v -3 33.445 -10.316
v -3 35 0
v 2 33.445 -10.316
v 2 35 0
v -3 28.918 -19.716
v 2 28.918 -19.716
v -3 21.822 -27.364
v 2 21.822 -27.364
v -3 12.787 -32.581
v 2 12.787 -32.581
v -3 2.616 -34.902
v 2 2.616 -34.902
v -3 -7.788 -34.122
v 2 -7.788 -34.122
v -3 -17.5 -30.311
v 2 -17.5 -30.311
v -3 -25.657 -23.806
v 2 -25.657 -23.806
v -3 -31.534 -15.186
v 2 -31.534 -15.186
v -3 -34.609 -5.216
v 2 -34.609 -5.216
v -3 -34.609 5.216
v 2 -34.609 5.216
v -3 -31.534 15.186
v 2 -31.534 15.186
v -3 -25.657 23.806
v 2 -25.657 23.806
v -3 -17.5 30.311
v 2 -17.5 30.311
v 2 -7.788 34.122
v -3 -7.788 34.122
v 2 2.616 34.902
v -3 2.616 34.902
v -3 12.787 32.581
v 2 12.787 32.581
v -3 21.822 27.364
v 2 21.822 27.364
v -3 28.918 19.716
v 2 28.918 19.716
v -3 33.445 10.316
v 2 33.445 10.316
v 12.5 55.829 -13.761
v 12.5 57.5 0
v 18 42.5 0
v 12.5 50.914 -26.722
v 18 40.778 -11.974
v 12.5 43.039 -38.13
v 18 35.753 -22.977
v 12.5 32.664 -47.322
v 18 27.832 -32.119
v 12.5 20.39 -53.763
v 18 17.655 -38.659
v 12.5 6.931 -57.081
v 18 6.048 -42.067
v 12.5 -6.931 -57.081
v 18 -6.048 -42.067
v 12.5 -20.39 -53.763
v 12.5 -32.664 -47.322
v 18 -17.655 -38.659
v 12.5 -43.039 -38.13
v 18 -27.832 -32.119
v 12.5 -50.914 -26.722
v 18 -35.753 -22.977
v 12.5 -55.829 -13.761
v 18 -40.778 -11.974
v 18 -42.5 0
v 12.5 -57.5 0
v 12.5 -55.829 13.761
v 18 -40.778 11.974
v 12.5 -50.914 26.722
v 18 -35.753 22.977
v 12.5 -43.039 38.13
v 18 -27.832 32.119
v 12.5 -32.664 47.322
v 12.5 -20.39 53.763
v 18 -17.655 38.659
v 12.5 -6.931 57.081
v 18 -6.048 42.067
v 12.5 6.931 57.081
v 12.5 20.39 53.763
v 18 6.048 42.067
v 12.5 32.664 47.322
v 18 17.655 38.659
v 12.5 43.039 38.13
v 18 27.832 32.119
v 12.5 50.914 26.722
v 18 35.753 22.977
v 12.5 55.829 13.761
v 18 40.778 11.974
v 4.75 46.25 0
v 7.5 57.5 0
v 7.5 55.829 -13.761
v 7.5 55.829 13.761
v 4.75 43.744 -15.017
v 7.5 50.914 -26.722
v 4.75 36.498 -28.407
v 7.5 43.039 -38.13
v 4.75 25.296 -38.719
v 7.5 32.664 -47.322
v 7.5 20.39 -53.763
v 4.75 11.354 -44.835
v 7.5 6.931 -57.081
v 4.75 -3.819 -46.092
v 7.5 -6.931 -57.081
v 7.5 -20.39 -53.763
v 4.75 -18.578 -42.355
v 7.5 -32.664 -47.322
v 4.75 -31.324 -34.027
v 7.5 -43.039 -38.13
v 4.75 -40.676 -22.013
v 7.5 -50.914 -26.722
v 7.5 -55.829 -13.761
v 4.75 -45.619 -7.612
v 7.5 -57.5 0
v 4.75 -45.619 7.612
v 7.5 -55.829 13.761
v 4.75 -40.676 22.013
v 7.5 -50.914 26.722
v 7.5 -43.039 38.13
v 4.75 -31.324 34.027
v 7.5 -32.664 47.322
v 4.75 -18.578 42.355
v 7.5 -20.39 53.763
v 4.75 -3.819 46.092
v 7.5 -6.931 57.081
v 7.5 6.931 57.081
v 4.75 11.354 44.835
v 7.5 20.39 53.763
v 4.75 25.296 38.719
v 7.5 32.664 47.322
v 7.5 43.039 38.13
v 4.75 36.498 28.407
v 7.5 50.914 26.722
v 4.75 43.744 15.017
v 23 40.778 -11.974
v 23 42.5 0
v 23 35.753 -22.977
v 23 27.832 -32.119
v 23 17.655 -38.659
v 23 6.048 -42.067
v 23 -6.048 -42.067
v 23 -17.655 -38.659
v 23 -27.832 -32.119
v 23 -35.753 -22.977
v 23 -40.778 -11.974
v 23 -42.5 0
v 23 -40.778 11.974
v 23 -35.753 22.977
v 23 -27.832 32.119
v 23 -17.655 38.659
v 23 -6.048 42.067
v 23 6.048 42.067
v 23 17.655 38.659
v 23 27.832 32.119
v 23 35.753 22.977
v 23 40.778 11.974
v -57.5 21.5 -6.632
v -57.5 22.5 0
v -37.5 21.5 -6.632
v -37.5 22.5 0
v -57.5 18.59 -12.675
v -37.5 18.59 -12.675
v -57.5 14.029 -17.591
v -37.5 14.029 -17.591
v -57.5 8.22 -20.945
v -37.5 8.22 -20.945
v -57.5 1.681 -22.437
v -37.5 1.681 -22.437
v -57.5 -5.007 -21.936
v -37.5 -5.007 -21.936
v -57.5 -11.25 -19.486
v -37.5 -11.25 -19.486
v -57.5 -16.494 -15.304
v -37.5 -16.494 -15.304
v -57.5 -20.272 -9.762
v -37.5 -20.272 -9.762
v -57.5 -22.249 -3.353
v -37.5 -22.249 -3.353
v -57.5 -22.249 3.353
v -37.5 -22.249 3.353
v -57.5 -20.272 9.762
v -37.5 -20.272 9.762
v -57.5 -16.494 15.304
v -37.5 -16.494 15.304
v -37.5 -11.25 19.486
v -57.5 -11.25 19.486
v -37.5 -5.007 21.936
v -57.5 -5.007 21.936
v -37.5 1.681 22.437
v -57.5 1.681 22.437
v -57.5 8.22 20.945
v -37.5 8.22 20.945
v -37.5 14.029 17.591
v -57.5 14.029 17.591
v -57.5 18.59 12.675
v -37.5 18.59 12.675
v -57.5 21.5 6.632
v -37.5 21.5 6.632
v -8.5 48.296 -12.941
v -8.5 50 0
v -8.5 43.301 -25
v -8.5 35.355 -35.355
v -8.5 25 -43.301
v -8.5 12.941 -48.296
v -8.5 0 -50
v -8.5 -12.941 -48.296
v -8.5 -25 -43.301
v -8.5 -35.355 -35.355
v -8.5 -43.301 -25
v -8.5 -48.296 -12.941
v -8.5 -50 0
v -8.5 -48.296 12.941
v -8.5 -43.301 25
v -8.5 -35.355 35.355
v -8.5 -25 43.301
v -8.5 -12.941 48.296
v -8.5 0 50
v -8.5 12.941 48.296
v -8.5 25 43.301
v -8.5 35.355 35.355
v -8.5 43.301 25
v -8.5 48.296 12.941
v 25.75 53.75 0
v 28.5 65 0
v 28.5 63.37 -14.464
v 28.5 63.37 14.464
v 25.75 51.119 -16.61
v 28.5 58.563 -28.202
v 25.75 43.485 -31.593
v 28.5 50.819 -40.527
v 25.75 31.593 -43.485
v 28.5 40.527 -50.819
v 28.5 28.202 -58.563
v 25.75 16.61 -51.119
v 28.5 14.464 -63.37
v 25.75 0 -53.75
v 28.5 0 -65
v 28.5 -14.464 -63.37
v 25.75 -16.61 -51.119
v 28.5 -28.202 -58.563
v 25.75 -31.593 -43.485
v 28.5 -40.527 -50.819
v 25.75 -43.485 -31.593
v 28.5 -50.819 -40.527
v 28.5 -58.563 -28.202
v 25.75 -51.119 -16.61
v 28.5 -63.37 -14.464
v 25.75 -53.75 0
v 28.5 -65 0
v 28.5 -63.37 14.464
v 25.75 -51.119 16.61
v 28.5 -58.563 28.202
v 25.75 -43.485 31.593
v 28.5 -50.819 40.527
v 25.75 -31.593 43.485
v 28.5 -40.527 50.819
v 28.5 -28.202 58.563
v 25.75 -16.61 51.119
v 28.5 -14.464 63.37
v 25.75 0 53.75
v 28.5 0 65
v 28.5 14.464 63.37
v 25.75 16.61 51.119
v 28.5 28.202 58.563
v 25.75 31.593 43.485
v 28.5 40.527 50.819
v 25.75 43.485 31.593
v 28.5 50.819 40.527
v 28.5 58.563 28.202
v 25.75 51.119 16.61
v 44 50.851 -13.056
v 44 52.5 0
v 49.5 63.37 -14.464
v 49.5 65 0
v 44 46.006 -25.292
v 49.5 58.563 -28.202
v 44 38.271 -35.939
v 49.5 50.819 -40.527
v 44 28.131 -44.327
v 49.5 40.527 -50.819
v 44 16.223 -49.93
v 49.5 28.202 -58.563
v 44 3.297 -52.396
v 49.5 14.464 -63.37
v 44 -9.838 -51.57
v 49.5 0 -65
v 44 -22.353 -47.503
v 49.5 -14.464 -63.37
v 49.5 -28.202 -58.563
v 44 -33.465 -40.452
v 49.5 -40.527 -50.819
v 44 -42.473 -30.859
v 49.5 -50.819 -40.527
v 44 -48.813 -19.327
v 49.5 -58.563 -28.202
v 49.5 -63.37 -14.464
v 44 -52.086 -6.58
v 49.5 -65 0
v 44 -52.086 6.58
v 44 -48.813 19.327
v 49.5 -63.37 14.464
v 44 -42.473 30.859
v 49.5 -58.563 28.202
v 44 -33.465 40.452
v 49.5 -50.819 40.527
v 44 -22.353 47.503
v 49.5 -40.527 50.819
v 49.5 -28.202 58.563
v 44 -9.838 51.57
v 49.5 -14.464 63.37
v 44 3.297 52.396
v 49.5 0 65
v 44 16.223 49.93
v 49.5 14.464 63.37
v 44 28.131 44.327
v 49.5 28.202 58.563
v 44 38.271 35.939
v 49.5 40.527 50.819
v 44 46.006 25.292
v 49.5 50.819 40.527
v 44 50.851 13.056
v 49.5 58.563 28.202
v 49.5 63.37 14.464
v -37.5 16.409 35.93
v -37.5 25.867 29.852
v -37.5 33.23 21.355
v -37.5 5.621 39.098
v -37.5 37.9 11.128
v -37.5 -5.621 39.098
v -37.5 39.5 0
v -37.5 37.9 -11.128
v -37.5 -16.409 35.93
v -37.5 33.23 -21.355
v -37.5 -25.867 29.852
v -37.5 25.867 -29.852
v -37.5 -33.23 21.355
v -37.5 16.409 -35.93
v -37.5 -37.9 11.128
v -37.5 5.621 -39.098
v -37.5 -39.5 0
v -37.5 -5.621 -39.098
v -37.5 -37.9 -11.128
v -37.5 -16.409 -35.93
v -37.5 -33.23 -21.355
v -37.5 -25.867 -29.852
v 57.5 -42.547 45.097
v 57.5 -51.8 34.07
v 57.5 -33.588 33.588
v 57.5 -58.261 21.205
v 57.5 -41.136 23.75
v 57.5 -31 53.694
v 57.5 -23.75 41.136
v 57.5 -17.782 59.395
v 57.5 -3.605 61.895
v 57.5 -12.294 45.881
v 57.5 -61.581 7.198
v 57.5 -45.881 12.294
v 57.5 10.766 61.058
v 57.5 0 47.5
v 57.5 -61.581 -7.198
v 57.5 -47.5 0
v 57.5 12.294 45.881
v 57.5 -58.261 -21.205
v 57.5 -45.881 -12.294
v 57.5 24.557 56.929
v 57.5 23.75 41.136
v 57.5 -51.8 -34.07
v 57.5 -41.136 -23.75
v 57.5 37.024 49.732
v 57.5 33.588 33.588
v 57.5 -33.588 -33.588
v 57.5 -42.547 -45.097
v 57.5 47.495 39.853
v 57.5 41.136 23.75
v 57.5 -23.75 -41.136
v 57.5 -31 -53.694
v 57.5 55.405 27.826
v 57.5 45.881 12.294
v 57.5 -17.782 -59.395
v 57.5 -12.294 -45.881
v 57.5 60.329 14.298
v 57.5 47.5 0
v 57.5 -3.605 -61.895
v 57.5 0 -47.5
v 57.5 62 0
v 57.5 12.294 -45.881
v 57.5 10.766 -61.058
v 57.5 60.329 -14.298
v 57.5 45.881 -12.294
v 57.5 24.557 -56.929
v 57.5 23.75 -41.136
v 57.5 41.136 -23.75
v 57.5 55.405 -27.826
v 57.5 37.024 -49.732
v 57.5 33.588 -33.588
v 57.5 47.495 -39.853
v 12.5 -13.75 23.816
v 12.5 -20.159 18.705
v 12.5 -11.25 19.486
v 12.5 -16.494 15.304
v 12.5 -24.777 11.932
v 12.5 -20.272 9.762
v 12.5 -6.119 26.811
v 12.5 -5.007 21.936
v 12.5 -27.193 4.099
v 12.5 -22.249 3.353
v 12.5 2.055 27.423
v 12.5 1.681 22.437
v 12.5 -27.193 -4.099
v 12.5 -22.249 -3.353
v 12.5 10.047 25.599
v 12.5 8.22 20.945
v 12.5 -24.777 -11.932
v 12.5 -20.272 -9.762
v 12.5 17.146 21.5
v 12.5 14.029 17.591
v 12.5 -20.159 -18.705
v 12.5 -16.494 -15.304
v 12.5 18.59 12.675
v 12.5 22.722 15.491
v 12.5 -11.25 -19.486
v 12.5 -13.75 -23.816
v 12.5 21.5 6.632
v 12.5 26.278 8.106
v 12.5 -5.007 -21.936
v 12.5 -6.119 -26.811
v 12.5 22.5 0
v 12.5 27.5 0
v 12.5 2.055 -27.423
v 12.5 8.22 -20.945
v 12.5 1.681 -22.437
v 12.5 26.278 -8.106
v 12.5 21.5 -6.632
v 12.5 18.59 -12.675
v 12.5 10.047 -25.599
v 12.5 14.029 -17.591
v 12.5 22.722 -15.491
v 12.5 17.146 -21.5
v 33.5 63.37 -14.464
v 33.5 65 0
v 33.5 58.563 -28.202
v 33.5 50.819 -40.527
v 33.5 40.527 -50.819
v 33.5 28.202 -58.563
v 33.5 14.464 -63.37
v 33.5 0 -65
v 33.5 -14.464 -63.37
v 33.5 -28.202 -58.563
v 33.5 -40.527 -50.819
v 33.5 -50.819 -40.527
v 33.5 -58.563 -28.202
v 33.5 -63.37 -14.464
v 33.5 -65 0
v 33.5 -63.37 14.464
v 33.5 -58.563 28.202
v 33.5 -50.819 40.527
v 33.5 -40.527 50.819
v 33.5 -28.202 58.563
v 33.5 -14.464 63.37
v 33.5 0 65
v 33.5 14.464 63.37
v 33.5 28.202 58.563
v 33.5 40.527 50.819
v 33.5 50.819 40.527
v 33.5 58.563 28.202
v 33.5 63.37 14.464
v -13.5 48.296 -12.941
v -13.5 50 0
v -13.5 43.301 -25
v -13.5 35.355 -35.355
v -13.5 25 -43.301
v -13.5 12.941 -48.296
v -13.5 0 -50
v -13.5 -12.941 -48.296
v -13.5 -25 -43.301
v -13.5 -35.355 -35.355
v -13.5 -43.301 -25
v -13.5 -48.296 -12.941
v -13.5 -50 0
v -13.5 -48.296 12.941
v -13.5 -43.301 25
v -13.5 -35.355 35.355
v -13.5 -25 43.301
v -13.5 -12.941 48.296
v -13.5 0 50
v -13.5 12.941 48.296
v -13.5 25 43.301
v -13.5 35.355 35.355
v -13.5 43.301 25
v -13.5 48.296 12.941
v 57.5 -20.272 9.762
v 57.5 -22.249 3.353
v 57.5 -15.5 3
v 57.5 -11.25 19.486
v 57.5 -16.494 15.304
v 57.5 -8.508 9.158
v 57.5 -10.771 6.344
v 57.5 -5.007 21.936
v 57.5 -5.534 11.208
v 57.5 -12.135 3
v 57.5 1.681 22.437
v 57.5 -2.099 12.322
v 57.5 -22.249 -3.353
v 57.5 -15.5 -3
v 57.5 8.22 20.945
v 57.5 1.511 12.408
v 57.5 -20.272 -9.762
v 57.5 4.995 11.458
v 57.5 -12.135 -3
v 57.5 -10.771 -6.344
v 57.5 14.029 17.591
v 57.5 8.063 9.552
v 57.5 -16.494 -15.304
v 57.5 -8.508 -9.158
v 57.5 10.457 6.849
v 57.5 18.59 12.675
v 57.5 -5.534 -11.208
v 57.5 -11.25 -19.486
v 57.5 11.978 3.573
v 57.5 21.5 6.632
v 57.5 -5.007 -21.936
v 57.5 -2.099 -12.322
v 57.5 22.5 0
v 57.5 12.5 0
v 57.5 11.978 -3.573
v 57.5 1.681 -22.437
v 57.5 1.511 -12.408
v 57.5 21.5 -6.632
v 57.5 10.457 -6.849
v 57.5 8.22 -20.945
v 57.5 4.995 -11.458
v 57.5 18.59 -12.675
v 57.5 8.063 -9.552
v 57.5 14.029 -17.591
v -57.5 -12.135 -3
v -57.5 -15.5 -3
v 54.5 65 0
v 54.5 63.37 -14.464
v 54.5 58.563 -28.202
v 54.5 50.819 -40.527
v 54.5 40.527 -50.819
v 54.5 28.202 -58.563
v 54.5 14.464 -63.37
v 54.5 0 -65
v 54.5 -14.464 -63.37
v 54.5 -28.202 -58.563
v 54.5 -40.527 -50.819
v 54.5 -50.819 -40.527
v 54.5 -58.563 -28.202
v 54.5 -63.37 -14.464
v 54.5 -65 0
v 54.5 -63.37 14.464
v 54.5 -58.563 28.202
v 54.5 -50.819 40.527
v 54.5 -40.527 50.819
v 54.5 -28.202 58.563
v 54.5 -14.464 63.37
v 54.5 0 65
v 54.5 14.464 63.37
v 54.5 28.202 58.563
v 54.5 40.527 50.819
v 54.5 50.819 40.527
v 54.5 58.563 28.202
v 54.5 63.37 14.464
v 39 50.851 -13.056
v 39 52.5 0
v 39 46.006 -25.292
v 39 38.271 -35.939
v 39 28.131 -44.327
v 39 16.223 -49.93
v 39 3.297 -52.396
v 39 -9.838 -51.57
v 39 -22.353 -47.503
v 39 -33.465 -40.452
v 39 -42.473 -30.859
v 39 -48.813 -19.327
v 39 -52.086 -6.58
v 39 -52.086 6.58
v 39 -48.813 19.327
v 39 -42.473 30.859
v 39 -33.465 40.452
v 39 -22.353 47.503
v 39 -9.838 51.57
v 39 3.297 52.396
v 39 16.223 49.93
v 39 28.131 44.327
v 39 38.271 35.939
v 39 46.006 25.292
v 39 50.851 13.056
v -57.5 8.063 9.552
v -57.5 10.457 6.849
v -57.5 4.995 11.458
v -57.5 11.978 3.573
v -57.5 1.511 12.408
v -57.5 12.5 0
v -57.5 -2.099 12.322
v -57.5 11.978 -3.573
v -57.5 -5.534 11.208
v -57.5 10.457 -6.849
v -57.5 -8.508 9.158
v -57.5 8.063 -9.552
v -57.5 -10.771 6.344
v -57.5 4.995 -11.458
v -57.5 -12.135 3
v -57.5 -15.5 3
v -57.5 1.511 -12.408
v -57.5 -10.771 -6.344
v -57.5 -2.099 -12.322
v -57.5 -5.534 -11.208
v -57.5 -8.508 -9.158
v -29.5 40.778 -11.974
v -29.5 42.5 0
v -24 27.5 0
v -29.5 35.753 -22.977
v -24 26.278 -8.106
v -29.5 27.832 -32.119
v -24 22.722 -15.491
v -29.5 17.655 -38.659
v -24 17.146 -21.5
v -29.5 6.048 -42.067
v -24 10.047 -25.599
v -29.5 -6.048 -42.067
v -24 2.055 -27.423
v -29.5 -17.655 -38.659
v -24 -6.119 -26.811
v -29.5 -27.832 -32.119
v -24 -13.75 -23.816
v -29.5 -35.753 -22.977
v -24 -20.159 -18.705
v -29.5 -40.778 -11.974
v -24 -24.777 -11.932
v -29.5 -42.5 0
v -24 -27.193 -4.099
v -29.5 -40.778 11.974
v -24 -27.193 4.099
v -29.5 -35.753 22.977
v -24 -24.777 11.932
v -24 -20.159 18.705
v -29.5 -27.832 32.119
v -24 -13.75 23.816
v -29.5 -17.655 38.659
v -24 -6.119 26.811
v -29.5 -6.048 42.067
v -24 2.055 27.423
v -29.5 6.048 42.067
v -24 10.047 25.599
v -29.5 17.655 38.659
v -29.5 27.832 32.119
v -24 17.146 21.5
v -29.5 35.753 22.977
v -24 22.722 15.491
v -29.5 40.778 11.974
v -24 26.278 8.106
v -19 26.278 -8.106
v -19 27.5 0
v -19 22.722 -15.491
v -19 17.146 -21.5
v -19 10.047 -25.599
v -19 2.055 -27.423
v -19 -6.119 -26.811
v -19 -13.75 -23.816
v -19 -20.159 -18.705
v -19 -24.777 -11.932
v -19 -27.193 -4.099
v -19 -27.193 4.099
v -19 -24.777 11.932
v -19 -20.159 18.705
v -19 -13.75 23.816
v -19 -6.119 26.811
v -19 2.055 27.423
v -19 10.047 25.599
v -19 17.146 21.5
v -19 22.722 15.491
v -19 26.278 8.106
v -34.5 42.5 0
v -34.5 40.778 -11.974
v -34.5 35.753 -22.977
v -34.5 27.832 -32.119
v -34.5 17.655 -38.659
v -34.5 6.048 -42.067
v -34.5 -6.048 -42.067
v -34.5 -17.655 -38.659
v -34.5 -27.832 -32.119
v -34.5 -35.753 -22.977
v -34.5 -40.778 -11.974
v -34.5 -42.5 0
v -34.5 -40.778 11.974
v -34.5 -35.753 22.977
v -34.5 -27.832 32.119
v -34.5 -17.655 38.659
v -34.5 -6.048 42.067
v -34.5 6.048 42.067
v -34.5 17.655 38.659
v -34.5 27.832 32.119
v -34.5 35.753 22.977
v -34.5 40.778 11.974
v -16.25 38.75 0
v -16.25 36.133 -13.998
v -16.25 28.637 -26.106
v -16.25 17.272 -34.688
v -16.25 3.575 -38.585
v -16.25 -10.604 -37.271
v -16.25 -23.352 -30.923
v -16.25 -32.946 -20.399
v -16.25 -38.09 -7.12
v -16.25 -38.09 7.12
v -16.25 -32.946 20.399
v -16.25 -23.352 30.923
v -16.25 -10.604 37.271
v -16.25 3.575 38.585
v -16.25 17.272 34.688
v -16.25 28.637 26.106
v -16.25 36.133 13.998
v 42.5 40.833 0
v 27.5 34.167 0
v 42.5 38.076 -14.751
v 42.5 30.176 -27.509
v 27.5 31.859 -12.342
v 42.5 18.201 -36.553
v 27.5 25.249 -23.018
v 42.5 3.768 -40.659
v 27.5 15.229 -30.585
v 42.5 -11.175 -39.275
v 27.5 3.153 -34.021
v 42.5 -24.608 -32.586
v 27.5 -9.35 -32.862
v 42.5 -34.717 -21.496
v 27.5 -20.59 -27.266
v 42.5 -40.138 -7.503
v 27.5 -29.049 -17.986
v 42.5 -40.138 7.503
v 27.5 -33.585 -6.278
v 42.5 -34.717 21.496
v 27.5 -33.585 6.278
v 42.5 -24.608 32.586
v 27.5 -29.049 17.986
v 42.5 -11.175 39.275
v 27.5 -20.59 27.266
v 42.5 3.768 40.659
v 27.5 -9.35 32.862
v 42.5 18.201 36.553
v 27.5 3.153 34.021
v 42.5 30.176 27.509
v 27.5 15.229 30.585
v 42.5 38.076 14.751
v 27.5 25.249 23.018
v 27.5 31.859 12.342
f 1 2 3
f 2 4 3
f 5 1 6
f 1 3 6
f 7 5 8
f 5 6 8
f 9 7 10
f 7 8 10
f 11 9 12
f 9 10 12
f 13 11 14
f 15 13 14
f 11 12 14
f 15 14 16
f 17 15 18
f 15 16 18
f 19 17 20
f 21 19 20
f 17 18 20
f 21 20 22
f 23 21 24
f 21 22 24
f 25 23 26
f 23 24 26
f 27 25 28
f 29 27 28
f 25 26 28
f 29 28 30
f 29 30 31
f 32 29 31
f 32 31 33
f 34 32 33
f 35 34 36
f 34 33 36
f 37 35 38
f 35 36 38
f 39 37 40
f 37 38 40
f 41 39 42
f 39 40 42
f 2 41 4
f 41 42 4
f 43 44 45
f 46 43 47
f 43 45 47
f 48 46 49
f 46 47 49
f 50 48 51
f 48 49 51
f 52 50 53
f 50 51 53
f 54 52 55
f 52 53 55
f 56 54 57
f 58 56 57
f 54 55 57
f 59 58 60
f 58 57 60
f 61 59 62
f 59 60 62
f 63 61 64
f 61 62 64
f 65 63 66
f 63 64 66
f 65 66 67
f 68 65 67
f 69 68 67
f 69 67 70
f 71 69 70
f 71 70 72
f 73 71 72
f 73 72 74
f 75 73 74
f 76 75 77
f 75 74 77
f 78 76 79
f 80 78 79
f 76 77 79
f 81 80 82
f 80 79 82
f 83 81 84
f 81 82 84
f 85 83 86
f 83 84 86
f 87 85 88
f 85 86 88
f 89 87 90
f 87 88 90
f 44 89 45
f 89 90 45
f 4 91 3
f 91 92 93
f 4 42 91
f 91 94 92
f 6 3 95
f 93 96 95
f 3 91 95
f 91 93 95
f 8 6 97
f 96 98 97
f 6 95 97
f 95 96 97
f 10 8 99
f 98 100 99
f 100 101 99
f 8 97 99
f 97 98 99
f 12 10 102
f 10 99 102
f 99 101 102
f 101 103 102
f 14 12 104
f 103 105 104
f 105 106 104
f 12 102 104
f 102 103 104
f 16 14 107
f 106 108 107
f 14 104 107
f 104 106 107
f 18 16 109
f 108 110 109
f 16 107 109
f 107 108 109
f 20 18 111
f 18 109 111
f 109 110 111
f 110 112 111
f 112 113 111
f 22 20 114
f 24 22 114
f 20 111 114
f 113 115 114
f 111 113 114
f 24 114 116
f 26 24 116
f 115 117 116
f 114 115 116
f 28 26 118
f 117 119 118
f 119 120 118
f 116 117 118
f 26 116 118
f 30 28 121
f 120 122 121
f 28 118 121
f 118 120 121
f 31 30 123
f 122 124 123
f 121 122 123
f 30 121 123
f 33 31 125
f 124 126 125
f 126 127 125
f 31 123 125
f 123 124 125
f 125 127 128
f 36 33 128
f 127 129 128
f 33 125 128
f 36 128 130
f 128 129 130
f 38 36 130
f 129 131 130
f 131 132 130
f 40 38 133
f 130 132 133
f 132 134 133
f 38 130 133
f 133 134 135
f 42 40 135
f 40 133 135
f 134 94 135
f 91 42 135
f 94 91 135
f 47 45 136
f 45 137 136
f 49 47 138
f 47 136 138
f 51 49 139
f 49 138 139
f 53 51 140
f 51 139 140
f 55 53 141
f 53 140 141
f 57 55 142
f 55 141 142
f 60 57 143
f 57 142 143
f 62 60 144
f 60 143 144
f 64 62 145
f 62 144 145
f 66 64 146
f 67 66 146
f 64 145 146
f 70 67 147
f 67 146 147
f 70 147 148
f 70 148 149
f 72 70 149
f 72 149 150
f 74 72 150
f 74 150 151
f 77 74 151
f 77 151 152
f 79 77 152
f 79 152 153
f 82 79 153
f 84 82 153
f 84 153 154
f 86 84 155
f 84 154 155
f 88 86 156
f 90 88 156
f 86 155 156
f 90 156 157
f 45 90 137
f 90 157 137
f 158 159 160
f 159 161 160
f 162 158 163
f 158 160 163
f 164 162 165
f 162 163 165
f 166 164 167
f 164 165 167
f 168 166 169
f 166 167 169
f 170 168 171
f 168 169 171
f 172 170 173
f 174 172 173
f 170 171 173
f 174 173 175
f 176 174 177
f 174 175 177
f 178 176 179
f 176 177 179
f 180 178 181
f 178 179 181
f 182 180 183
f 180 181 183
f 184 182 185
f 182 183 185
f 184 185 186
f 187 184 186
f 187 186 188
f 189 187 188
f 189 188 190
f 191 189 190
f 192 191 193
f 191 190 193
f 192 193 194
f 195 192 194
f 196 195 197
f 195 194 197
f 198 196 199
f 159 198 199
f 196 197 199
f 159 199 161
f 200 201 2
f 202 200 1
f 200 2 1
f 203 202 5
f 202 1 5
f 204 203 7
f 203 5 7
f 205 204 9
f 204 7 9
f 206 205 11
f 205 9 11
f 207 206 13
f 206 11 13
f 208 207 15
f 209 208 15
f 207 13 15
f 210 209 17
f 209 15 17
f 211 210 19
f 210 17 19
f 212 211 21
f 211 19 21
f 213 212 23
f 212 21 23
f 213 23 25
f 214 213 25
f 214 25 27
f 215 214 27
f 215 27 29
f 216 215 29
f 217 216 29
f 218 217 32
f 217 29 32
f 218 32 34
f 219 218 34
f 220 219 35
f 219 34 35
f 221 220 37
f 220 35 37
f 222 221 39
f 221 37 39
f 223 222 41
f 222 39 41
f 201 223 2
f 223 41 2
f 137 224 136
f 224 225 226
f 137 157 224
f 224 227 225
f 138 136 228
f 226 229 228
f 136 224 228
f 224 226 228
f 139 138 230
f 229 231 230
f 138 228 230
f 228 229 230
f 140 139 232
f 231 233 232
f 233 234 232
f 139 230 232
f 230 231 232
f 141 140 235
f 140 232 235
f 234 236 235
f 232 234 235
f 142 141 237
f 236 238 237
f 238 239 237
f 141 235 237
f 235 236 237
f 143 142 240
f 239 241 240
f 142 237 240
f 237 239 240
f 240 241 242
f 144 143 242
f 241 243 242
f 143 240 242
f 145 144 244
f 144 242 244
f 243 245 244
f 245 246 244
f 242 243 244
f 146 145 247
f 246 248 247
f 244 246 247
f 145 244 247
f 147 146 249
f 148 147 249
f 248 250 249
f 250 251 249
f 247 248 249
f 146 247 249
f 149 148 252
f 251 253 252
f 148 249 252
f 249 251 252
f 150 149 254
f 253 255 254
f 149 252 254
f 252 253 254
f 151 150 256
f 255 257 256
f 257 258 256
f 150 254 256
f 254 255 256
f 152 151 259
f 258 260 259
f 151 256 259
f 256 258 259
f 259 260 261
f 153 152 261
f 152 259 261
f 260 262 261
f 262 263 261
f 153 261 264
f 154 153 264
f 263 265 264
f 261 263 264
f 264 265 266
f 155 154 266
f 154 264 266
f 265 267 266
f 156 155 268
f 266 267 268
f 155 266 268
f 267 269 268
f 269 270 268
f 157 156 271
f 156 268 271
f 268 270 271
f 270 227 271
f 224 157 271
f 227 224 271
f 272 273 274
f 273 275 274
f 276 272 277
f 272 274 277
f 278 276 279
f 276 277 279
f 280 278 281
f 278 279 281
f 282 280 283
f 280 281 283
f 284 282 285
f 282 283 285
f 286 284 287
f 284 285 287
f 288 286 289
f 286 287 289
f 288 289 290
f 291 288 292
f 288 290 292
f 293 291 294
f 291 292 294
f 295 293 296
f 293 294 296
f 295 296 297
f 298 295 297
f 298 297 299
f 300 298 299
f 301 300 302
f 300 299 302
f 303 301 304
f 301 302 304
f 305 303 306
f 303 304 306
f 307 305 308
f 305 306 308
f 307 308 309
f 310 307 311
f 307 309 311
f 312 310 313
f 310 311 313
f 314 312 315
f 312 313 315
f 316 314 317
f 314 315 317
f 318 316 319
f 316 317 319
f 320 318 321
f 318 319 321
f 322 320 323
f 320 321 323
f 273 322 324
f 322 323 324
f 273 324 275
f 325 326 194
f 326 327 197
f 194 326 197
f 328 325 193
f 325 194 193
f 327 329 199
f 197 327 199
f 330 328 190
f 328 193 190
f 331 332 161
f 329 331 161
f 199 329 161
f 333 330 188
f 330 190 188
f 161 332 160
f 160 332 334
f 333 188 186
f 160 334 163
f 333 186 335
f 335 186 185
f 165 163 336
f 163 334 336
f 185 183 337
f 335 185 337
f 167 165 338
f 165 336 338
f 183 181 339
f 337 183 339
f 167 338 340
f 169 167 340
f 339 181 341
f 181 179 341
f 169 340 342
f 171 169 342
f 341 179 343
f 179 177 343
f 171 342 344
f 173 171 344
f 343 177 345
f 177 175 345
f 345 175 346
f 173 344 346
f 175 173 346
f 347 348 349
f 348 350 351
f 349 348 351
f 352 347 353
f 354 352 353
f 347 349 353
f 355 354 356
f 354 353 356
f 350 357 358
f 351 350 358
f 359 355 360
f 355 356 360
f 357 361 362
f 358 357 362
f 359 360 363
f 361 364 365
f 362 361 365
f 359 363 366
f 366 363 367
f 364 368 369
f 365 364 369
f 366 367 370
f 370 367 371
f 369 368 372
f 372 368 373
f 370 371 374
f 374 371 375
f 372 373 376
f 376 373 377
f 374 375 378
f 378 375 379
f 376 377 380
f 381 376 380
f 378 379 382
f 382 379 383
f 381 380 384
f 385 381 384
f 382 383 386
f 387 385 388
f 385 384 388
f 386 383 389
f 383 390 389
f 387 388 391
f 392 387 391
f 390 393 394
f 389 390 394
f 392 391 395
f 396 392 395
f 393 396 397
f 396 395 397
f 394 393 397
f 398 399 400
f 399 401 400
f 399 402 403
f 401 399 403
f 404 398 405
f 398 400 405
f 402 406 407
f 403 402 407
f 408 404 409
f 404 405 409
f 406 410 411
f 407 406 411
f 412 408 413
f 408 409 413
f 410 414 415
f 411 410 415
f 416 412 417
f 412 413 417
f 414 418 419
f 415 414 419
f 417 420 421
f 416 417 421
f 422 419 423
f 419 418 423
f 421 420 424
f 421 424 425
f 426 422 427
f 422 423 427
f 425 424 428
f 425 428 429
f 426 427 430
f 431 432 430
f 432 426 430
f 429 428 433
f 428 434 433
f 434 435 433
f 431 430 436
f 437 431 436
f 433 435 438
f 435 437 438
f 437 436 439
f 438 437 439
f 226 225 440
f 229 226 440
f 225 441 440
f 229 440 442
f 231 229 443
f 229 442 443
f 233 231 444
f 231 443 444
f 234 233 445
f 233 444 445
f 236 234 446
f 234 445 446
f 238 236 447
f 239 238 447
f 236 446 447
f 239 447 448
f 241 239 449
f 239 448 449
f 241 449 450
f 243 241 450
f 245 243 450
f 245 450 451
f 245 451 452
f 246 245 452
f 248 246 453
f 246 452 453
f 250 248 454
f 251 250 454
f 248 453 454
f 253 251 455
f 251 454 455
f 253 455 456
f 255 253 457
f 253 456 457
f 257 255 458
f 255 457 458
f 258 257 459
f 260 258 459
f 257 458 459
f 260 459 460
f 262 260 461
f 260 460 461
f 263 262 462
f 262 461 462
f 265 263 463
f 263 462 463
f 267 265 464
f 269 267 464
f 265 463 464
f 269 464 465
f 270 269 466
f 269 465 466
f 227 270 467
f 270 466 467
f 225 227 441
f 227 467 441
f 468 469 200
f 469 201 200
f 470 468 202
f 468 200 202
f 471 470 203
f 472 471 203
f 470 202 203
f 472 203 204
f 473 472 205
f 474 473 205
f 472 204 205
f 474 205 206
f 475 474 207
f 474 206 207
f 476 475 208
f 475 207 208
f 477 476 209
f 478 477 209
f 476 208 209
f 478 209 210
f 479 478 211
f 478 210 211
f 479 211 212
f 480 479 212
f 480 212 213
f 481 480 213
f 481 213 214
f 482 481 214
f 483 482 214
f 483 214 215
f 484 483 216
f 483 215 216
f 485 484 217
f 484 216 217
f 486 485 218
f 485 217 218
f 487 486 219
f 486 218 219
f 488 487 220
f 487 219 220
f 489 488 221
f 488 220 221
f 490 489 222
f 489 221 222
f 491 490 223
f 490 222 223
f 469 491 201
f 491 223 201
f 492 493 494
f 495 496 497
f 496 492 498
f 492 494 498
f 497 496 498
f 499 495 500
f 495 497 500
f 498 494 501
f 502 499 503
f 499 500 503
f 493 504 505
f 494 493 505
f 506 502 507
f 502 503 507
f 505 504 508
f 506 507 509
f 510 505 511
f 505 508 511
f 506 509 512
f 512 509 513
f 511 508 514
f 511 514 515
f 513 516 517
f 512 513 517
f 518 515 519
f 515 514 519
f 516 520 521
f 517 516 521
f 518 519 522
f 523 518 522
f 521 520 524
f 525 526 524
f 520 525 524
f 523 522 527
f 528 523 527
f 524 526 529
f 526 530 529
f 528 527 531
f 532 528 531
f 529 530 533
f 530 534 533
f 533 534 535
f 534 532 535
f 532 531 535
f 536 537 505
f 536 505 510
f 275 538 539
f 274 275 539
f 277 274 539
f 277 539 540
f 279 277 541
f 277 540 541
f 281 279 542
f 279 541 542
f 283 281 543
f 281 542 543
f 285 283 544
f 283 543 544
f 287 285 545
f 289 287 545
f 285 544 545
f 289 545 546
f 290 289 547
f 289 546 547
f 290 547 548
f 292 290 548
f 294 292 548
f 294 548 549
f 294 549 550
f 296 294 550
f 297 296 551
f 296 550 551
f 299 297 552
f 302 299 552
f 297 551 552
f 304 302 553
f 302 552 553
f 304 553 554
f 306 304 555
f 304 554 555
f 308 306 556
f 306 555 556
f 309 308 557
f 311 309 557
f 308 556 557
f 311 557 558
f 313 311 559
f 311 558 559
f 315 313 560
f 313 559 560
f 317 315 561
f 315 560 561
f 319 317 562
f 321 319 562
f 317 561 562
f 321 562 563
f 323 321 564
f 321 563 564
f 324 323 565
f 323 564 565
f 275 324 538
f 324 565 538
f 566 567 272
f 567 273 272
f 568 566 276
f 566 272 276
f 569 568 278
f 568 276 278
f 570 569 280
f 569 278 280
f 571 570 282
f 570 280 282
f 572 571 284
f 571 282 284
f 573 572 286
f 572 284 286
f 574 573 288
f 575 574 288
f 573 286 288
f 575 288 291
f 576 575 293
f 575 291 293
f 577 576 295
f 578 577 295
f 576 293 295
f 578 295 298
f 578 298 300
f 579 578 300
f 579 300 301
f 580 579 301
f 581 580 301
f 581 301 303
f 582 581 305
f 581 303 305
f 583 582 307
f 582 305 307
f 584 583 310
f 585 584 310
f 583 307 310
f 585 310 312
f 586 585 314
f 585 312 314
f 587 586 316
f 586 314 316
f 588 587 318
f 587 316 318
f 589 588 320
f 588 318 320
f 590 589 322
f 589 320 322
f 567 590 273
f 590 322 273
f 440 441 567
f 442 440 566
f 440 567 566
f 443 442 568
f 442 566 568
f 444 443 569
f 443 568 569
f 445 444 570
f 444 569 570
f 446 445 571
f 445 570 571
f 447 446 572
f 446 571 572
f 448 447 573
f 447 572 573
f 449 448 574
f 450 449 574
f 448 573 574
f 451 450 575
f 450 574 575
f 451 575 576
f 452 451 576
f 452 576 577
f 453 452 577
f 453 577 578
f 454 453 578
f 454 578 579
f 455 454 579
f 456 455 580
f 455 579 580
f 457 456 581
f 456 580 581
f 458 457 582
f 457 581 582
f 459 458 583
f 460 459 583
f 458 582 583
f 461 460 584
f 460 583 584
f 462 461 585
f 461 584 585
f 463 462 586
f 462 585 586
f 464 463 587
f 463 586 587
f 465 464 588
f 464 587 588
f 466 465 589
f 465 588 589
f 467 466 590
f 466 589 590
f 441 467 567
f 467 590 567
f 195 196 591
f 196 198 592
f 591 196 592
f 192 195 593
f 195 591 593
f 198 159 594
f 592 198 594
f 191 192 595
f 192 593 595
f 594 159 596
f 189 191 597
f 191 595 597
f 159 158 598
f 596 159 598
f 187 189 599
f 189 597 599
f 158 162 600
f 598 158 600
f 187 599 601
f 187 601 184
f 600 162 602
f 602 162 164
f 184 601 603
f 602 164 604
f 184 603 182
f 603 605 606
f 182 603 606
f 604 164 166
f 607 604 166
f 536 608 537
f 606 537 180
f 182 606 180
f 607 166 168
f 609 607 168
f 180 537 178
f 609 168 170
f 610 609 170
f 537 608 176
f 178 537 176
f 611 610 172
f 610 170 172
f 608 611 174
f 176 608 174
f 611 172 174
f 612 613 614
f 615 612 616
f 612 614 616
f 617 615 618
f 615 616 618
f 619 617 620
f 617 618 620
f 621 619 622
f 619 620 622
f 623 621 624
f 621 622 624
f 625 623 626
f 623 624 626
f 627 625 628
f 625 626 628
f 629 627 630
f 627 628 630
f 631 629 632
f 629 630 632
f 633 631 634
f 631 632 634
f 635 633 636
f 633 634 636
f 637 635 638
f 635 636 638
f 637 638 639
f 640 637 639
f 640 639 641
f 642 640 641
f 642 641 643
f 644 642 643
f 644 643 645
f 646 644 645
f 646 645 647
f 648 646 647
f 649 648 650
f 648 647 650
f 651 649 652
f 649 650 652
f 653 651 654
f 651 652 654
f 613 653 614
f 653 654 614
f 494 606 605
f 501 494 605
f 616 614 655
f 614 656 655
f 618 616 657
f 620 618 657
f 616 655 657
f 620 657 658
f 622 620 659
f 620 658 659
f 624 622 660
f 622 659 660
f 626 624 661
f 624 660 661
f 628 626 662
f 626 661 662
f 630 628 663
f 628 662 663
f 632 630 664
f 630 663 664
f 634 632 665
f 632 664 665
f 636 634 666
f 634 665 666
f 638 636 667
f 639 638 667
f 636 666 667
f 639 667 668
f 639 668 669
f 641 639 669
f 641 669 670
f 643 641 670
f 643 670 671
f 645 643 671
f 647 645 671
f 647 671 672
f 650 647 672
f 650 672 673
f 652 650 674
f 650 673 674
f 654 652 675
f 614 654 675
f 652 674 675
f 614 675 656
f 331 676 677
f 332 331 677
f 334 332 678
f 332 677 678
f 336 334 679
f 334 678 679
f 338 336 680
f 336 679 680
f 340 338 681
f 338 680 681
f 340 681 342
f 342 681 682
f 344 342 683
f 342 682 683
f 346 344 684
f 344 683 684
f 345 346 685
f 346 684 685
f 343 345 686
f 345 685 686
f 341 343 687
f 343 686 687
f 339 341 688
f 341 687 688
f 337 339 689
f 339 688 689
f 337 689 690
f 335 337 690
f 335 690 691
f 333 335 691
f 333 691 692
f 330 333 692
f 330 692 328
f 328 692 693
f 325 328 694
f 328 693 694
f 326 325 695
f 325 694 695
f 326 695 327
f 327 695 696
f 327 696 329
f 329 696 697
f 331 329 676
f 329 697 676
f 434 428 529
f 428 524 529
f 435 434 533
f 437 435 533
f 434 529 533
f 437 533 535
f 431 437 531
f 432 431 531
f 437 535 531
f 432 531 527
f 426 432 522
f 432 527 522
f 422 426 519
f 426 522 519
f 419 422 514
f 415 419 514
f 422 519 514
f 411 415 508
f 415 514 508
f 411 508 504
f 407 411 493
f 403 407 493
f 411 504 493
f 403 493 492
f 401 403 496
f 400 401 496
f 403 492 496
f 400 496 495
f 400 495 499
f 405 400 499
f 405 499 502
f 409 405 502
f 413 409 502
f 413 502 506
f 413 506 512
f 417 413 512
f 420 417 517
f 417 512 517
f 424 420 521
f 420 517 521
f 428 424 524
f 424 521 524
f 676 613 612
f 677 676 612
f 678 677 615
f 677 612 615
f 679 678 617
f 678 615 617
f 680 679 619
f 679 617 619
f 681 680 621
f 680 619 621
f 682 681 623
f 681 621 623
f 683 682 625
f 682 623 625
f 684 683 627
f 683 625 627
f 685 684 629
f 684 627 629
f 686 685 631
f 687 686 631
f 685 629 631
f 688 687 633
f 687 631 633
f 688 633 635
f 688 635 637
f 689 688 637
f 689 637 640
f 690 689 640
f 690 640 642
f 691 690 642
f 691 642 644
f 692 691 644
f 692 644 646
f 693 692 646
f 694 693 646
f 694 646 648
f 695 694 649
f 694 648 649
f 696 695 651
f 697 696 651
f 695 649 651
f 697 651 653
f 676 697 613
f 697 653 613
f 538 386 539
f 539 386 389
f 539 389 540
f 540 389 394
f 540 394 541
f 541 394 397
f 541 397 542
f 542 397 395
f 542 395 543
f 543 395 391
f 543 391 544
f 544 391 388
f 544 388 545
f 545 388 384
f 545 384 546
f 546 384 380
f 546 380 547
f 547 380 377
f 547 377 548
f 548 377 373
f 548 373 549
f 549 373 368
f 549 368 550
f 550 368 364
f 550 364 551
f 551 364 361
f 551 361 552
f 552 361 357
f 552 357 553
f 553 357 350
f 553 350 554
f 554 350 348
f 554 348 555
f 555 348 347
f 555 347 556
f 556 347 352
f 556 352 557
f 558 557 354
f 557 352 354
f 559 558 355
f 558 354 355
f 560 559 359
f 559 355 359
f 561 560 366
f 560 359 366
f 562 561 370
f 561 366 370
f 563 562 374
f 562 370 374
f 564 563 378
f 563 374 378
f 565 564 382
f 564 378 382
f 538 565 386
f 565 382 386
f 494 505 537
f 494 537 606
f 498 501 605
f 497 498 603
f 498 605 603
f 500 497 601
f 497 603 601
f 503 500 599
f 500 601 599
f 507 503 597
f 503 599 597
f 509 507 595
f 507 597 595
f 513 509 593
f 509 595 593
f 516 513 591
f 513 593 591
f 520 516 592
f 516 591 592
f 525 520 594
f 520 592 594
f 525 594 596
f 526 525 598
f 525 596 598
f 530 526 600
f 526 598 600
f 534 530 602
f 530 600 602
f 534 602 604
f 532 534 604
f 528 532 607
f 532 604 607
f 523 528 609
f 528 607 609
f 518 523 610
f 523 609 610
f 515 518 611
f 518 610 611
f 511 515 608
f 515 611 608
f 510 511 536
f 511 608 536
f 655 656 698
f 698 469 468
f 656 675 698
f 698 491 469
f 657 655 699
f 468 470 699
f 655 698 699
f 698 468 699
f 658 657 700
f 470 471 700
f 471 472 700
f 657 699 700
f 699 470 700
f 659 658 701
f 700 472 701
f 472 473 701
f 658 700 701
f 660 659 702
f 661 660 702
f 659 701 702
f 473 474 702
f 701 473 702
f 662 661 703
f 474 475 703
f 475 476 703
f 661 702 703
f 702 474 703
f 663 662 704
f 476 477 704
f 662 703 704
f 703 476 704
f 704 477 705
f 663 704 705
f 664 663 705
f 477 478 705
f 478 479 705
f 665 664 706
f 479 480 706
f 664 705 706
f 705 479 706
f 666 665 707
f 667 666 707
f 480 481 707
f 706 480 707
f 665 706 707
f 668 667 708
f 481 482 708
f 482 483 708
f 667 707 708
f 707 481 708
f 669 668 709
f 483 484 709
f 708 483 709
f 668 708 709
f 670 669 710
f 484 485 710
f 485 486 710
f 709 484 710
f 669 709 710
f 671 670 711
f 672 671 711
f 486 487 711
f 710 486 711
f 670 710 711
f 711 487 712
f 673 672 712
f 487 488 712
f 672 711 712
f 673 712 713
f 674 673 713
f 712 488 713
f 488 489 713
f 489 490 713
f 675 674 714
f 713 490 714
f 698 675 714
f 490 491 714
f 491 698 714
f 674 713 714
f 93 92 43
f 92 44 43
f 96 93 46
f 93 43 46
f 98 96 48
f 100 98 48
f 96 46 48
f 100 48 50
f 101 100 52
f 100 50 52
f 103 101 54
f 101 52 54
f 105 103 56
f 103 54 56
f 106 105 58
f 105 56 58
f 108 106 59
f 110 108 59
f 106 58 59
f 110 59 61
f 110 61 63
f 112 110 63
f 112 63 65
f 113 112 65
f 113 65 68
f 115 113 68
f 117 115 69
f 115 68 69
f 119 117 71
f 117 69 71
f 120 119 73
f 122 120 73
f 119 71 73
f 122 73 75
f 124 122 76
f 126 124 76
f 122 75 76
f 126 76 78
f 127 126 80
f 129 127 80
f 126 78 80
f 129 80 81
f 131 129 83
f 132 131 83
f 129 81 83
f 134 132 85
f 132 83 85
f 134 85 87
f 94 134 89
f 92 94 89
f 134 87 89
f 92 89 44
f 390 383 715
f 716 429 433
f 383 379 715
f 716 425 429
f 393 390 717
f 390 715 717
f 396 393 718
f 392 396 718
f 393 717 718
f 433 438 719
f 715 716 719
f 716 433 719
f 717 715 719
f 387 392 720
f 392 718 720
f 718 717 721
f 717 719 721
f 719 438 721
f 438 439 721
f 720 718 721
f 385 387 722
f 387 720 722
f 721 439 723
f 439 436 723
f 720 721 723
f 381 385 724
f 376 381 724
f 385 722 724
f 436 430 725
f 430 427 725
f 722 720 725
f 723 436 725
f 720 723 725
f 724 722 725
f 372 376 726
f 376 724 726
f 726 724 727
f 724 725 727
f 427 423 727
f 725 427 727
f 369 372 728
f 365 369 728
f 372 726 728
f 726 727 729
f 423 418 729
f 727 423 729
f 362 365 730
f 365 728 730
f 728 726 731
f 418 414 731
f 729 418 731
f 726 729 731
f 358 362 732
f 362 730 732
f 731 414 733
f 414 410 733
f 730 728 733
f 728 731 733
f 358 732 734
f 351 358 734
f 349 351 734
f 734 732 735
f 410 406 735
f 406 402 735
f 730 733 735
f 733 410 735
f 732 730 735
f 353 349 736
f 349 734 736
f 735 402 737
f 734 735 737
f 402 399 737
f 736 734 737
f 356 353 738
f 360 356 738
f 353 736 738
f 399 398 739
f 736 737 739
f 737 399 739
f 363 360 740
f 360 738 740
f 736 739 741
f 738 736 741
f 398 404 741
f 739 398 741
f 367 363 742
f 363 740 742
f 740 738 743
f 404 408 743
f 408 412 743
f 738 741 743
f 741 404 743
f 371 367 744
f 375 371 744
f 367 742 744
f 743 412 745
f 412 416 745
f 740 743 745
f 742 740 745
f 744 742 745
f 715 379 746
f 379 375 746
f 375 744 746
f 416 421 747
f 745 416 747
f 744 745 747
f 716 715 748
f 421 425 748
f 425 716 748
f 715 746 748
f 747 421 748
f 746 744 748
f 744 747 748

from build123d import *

# Parameters (mm, degrees)
CHAMFER1_SIZE      = 3
SKETCH2_W          = 6
SKETCH2_H          = 6
CUT_EXTRUDE1_DEPTH = 116


with BuildPart() as part:
    # Sketch1 → Revolve1 (revolve)
    with BuildSketch(Plane.XY):
        Polygon((57.5, 12.5), (-57.5, 12.5), (-57.5, 22.5), (-37.5, 22.5), (-37.5, 42.5), (-29.5, 42.5), (-24, 27.5), (-19, 27.5), (-13.5, 50), (-8.5, 50), (-3, 35), (2, 35), (7.5, 57.5), (12.5, 57.5), (18, 42.5), (23, 42.5), (28.5, 65), (33.5, 65), (39, 52.5), (44, 52.5), (49.5, 65), (57.5, 65), (57.5, 47.5), (12.5, 27.5), (12.5, 22.5), (57.5, 22.5), align=None)
    revolve(axis=Axis((57.5, 0, 0), (-1, 0, 0)))

    # Chamfer1
    chamfer1_edges = [part.edges().sort_by_distance(p)[0] for p in [
        (57.5, -65, 0),
        (-37.5, -42.5, 0),
    ]]
    chamfer(chamfer1_edges, length=CHAMFER1_SIZE)

    # Sketch2 → Cut-Extrude1 (cut, through all)
    with BuildSketch(Plane.ZY.offset(57.5)):
        with Locations((0, -12.5)):
            Rectangle(SKETCH2_W, SKETCH2_H)
    extrude(amount=-CUT_EXTRUDE1_DEPTH, mode=Mode.SUBTRACT)


solid = part.part
